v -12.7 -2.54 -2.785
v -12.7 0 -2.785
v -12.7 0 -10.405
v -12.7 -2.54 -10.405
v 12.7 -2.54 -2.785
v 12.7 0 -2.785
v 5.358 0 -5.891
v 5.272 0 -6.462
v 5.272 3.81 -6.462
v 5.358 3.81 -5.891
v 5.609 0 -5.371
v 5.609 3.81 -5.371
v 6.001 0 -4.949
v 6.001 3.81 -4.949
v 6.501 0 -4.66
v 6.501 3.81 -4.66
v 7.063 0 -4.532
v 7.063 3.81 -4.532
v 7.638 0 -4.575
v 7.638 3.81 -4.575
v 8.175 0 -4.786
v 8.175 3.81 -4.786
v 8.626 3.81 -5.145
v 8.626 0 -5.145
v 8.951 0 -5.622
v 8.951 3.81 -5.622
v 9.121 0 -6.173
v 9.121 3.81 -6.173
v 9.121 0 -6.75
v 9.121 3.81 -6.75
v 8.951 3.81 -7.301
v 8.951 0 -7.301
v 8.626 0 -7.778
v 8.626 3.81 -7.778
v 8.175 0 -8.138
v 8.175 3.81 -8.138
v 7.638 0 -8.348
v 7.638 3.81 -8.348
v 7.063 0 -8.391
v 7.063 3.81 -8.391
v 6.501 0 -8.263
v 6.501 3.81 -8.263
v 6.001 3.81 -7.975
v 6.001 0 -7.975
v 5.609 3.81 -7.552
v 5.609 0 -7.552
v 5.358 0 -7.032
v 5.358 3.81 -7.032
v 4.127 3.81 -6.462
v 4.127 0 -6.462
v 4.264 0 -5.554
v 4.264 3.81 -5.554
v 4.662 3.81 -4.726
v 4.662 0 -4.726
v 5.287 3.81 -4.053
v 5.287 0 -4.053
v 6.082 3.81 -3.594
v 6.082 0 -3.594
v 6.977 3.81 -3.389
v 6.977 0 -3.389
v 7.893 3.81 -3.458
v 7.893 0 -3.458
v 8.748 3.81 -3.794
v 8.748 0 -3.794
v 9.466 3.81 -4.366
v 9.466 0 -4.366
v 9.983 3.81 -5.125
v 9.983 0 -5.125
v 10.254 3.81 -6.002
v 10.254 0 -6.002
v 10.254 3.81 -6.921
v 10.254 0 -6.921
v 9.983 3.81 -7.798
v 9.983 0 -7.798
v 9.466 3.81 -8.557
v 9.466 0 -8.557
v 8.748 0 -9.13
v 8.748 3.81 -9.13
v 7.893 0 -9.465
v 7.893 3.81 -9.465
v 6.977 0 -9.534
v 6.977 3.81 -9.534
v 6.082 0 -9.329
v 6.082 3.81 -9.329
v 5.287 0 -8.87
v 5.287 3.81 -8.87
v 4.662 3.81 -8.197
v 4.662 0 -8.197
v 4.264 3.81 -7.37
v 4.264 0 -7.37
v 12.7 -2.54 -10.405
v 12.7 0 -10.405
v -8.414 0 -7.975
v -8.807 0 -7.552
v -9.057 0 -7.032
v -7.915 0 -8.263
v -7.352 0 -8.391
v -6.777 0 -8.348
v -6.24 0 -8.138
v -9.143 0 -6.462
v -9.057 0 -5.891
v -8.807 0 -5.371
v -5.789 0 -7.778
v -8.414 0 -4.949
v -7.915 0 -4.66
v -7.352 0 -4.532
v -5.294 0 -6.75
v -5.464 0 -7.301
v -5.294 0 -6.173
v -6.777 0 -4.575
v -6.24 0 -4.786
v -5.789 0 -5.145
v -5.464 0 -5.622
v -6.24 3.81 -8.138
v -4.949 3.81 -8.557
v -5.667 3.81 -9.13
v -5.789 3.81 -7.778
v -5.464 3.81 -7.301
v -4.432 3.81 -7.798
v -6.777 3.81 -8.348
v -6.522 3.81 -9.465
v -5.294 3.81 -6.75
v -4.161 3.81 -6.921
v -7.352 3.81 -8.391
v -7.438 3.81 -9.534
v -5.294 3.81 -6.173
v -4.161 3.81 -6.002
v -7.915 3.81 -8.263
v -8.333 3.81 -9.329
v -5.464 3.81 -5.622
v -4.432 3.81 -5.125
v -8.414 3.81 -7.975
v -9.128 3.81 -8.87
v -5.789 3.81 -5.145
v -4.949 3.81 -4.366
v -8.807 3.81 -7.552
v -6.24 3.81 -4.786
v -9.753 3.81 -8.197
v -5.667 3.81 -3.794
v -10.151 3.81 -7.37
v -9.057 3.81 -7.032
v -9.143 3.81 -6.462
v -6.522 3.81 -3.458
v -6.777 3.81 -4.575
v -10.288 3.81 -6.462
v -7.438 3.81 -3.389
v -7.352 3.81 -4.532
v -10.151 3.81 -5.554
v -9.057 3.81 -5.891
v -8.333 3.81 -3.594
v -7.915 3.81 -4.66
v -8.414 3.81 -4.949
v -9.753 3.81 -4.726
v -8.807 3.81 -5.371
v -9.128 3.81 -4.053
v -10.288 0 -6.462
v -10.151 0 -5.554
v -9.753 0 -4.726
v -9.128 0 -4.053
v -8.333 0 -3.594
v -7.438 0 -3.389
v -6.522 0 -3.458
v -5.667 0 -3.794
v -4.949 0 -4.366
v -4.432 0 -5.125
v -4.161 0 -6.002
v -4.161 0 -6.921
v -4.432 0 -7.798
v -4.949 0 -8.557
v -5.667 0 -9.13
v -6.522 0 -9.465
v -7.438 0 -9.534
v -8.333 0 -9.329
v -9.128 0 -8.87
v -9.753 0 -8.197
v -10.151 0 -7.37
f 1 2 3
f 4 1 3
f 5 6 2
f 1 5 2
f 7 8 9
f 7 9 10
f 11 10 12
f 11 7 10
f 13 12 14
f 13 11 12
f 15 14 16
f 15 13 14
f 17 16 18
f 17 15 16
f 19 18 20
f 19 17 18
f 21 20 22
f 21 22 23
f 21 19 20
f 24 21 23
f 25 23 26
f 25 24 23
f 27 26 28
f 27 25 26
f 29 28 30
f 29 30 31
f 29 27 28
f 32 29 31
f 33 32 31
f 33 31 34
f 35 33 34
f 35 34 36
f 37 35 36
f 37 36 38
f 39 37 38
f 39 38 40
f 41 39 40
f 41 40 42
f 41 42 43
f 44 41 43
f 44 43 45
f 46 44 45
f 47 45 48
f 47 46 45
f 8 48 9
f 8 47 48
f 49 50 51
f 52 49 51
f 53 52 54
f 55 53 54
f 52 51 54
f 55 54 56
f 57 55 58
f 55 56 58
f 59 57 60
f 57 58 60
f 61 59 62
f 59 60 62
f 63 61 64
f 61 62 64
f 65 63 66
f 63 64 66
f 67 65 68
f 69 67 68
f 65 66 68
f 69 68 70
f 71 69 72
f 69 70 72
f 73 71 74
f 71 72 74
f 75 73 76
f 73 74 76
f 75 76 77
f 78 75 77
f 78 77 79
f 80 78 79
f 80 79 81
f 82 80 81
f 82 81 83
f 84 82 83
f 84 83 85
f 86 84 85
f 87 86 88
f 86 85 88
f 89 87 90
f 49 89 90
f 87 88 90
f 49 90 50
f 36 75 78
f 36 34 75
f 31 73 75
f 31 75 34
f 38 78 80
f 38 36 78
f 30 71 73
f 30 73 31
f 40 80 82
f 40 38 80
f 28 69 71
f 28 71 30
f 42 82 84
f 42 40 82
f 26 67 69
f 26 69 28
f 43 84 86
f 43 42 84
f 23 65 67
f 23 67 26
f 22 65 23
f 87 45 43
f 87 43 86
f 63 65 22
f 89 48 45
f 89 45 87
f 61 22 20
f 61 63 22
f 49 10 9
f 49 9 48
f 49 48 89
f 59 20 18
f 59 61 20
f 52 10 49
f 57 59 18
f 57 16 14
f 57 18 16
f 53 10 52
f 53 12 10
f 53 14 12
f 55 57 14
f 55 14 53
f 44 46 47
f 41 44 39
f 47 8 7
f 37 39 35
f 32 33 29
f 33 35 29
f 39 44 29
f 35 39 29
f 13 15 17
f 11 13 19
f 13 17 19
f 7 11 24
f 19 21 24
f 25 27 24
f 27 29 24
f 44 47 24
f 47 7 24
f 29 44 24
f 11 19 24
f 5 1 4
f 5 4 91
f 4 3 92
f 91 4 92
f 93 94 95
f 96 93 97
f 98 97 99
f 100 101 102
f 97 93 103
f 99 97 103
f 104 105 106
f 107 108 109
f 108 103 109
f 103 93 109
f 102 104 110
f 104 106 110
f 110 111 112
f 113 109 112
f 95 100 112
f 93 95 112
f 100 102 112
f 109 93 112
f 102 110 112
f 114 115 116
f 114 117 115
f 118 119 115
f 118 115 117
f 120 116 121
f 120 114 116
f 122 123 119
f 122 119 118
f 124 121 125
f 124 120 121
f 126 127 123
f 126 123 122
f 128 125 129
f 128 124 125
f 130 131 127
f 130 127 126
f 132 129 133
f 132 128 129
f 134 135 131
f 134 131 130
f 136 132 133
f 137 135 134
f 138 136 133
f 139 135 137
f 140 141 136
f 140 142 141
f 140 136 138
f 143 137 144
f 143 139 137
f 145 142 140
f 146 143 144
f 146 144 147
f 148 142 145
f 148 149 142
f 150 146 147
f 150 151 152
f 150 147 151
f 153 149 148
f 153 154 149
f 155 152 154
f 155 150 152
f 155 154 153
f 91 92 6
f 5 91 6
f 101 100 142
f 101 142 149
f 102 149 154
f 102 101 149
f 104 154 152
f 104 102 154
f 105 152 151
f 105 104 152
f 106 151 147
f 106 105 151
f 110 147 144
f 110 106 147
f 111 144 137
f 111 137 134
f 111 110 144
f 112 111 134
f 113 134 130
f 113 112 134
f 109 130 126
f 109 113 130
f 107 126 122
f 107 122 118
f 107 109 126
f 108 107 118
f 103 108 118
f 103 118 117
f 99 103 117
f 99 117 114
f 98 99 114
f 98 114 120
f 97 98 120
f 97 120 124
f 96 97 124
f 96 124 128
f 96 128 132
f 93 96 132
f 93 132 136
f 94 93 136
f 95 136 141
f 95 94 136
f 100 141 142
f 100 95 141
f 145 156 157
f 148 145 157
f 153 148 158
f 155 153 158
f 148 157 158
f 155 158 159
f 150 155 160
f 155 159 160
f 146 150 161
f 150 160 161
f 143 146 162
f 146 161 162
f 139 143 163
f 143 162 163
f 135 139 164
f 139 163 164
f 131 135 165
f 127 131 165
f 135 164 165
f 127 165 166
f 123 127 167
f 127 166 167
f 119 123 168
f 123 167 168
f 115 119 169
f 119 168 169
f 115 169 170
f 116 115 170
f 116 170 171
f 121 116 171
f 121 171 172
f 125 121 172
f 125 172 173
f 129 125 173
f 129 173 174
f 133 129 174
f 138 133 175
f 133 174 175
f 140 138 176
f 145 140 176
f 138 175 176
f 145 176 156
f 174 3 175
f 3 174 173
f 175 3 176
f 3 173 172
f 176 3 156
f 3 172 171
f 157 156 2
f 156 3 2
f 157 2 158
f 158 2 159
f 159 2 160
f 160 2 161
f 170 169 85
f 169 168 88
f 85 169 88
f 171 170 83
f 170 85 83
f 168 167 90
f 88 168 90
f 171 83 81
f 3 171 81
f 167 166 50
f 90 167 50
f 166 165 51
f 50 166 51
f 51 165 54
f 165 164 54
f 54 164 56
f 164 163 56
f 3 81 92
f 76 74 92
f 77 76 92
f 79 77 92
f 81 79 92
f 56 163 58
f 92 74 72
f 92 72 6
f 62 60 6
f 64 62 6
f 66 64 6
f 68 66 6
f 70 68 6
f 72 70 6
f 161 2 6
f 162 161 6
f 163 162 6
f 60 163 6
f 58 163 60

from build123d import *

# Parameters (mm, degrees)
F1_DEPTH = 2.54
F2_R     = 3.080736
F2_R_2   = 1.935305
F3_DEPTH = 3.81


with BuildPart() as f1:
    # F0 (on Front) → F1 (new body)
    with BuildSketch(Plane.XZ):
        Polygon((12.7, -10.405478), (12.7, -2.785478), (-12.7, -2.785478), (-12.7, -10.405478), (0, -10.405478), align=None)
    extrude(amount=F1_DEPTH)

    # F2 (on face) → F3 (join)
    with BuildSketch(Plane(origin=(0, 0, 0), x_dir=(-1, 0, 0), z_dir=(0, 1, 0))):
        with Locations((-7.207552, -6.461604)):
            Circle(F2_R)
        with Locations((-7.207552, -6.461604)):
            Circle(F2_R_2, mode=Mode.SUBTRACT)
        with Locations((7.207552, -6.461604)):
            Circle(F2_R)
        with Locations((7.207552, -6.461604)):
            Circle(F2_R_2, mode=Mode.SUBTRACT)
    extrude(amount=F3_DEPTH)


solid = f1.part
